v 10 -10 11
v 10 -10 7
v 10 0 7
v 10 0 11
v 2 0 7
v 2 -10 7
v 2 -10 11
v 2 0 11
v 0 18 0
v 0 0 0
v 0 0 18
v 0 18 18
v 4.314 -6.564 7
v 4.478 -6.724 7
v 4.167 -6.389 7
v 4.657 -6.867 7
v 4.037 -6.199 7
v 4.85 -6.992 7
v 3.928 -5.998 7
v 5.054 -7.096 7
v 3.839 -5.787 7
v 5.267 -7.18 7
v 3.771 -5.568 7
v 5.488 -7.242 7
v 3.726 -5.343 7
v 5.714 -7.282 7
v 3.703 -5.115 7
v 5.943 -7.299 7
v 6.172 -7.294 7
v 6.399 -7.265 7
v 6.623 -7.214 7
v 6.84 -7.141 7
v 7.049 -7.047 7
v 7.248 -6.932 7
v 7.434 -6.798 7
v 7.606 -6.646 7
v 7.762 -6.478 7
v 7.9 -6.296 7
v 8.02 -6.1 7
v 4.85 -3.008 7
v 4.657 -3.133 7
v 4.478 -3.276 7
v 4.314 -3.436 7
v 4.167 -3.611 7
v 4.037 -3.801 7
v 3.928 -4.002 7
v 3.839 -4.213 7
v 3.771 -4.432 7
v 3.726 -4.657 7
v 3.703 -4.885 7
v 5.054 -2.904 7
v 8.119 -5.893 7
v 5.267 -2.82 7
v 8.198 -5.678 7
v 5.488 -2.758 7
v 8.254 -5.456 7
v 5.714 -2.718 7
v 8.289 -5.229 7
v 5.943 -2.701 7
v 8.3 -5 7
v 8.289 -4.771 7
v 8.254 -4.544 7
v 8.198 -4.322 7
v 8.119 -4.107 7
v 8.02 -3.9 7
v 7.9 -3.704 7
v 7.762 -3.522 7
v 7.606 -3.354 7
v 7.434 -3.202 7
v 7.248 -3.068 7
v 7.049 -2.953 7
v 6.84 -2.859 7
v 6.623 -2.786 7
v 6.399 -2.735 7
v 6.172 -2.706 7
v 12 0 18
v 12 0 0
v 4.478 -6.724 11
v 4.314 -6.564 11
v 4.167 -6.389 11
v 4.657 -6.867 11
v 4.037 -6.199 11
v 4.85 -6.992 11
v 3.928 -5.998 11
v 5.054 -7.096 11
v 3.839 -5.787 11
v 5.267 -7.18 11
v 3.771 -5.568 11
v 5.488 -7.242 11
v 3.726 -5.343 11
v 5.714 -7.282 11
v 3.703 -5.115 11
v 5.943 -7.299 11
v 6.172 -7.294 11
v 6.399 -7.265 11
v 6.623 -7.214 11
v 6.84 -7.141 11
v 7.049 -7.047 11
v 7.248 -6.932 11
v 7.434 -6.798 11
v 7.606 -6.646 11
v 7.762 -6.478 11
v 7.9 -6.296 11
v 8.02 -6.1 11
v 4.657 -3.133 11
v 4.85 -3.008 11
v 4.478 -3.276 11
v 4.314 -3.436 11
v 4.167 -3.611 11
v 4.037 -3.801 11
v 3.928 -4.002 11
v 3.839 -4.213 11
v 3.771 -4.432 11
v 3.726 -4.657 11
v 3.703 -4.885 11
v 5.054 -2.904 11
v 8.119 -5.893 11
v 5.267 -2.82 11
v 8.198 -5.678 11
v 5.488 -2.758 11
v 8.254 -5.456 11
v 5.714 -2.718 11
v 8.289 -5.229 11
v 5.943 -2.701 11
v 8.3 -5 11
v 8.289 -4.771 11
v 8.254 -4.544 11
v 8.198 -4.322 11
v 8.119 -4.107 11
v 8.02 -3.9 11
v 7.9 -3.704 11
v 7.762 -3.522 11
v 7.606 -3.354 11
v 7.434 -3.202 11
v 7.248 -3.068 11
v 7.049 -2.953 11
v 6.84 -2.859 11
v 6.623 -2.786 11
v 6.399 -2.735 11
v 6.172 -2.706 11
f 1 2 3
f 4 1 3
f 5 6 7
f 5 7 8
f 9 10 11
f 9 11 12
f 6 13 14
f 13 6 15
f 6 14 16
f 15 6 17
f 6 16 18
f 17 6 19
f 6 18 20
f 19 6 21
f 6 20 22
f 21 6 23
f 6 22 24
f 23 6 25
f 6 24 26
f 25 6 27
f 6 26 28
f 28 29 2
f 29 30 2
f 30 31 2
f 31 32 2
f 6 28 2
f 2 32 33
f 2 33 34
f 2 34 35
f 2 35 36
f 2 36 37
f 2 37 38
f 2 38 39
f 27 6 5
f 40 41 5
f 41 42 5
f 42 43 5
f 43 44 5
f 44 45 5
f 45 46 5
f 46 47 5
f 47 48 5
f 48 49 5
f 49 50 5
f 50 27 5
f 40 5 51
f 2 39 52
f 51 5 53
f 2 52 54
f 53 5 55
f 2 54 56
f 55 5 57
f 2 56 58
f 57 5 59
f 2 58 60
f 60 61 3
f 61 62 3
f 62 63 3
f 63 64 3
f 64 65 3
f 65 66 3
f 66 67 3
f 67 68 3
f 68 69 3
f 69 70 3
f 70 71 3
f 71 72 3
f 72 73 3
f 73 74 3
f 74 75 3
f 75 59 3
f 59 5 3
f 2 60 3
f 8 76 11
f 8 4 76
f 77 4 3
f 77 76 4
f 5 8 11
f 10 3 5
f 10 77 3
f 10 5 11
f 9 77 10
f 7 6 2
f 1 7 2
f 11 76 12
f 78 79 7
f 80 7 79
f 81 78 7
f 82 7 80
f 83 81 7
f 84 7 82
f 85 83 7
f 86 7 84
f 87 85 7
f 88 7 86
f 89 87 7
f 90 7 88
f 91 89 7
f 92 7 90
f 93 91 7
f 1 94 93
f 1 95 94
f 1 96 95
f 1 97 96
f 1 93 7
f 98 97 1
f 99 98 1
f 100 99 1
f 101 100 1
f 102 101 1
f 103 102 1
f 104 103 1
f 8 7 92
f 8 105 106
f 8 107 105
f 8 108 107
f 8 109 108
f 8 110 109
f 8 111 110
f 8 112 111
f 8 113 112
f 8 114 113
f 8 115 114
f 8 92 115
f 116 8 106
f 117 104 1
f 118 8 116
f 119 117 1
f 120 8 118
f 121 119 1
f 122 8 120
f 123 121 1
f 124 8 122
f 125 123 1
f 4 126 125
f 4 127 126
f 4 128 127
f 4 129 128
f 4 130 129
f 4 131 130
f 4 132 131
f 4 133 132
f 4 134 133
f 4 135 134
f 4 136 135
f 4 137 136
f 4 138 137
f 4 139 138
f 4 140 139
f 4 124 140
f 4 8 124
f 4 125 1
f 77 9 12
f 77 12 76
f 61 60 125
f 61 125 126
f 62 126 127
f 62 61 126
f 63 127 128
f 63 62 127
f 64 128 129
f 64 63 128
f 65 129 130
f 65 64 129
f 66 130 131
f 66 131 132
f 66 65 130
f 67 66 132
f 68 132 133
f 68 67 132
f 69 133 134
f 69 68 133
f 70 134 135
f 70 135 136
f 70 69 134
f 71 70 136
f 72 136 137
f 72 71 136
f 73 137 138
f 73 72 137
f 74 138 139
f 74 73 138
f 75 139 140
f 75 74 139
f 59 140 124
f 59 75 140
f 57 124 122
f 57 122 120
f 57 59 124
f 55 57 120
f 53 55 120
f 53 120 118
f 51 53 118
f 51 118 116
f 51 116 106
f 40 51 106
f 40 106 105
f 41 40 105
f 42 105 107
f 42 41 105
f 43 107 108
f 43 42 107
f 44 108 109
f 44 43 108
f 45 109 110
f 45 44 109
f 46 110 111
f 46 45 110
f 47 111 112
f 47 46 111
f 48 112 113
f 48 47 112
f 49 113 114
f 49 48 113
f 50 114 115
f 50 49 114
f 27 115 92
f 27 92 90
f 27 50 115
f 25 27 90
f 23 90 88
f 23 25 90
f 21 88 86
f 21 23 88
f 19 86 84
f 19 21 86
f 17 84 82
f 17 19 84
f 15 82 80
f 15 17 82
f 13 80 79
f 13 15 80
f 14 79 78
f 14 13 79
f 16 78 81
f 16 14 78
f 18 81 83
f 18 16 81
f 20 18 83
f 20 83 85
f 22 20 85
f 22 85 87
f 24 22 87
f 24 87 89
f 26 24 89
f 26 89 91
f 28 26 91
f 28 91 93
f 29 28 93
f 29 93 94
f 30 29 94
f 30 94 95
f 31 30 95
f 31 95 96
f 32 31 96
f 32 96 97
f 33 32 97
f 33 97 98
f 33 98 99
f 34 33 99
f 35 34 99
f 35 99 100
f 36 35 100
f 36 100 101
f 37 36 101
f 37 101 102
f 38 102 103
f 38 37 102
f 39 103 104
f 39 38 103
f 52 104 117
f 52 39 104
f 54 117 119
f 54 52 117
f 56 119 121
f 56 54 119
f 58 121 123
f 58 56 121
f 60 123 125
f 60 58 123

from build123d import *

# Parameters (mm, degrees)
BOSS_EXTRUDE1_DEPTH      = 18
BOSS_EXTRUDE2_DEPTH      = 2
BOSS_EXTRUDE2_DEPTH_BACK = 2
SKETCH2_W                = 8
SKETCH2_H                = 10
SKETCH2_R                = 2.3


with BuildPart() as part:
    # Sketch1 → Boss-Extrude1 (new body)
    with BuildSketch(Plane.XY):
        Polygon((0, 0), (0, 18), (12, 0), align=None)
    extrude(amount=BOSS_EXTRUDE1_DEPTH)

    # Sketch2 → Boss-Extrude2 (add, two sides: drawn at the far end of the back side and taken through both)
    with BuildSketch(Plane.XY.offset(9).offset(-BOSS_EXTRUDE2_DEPTH_BACK)):
        with Locations((6, -5)):
            Rectangle(SKETCH2_W, SKETCH2_H)
        with Locations((6, -5)):
            Circle(SKETCH2_R, mode=Mode.SUBTRACT)
    extrude(amount=BOSS_EXTRUDE2_DEPTH + BOSS_EXTRUDE2_DEPTH_BACK)


solid = part.part
